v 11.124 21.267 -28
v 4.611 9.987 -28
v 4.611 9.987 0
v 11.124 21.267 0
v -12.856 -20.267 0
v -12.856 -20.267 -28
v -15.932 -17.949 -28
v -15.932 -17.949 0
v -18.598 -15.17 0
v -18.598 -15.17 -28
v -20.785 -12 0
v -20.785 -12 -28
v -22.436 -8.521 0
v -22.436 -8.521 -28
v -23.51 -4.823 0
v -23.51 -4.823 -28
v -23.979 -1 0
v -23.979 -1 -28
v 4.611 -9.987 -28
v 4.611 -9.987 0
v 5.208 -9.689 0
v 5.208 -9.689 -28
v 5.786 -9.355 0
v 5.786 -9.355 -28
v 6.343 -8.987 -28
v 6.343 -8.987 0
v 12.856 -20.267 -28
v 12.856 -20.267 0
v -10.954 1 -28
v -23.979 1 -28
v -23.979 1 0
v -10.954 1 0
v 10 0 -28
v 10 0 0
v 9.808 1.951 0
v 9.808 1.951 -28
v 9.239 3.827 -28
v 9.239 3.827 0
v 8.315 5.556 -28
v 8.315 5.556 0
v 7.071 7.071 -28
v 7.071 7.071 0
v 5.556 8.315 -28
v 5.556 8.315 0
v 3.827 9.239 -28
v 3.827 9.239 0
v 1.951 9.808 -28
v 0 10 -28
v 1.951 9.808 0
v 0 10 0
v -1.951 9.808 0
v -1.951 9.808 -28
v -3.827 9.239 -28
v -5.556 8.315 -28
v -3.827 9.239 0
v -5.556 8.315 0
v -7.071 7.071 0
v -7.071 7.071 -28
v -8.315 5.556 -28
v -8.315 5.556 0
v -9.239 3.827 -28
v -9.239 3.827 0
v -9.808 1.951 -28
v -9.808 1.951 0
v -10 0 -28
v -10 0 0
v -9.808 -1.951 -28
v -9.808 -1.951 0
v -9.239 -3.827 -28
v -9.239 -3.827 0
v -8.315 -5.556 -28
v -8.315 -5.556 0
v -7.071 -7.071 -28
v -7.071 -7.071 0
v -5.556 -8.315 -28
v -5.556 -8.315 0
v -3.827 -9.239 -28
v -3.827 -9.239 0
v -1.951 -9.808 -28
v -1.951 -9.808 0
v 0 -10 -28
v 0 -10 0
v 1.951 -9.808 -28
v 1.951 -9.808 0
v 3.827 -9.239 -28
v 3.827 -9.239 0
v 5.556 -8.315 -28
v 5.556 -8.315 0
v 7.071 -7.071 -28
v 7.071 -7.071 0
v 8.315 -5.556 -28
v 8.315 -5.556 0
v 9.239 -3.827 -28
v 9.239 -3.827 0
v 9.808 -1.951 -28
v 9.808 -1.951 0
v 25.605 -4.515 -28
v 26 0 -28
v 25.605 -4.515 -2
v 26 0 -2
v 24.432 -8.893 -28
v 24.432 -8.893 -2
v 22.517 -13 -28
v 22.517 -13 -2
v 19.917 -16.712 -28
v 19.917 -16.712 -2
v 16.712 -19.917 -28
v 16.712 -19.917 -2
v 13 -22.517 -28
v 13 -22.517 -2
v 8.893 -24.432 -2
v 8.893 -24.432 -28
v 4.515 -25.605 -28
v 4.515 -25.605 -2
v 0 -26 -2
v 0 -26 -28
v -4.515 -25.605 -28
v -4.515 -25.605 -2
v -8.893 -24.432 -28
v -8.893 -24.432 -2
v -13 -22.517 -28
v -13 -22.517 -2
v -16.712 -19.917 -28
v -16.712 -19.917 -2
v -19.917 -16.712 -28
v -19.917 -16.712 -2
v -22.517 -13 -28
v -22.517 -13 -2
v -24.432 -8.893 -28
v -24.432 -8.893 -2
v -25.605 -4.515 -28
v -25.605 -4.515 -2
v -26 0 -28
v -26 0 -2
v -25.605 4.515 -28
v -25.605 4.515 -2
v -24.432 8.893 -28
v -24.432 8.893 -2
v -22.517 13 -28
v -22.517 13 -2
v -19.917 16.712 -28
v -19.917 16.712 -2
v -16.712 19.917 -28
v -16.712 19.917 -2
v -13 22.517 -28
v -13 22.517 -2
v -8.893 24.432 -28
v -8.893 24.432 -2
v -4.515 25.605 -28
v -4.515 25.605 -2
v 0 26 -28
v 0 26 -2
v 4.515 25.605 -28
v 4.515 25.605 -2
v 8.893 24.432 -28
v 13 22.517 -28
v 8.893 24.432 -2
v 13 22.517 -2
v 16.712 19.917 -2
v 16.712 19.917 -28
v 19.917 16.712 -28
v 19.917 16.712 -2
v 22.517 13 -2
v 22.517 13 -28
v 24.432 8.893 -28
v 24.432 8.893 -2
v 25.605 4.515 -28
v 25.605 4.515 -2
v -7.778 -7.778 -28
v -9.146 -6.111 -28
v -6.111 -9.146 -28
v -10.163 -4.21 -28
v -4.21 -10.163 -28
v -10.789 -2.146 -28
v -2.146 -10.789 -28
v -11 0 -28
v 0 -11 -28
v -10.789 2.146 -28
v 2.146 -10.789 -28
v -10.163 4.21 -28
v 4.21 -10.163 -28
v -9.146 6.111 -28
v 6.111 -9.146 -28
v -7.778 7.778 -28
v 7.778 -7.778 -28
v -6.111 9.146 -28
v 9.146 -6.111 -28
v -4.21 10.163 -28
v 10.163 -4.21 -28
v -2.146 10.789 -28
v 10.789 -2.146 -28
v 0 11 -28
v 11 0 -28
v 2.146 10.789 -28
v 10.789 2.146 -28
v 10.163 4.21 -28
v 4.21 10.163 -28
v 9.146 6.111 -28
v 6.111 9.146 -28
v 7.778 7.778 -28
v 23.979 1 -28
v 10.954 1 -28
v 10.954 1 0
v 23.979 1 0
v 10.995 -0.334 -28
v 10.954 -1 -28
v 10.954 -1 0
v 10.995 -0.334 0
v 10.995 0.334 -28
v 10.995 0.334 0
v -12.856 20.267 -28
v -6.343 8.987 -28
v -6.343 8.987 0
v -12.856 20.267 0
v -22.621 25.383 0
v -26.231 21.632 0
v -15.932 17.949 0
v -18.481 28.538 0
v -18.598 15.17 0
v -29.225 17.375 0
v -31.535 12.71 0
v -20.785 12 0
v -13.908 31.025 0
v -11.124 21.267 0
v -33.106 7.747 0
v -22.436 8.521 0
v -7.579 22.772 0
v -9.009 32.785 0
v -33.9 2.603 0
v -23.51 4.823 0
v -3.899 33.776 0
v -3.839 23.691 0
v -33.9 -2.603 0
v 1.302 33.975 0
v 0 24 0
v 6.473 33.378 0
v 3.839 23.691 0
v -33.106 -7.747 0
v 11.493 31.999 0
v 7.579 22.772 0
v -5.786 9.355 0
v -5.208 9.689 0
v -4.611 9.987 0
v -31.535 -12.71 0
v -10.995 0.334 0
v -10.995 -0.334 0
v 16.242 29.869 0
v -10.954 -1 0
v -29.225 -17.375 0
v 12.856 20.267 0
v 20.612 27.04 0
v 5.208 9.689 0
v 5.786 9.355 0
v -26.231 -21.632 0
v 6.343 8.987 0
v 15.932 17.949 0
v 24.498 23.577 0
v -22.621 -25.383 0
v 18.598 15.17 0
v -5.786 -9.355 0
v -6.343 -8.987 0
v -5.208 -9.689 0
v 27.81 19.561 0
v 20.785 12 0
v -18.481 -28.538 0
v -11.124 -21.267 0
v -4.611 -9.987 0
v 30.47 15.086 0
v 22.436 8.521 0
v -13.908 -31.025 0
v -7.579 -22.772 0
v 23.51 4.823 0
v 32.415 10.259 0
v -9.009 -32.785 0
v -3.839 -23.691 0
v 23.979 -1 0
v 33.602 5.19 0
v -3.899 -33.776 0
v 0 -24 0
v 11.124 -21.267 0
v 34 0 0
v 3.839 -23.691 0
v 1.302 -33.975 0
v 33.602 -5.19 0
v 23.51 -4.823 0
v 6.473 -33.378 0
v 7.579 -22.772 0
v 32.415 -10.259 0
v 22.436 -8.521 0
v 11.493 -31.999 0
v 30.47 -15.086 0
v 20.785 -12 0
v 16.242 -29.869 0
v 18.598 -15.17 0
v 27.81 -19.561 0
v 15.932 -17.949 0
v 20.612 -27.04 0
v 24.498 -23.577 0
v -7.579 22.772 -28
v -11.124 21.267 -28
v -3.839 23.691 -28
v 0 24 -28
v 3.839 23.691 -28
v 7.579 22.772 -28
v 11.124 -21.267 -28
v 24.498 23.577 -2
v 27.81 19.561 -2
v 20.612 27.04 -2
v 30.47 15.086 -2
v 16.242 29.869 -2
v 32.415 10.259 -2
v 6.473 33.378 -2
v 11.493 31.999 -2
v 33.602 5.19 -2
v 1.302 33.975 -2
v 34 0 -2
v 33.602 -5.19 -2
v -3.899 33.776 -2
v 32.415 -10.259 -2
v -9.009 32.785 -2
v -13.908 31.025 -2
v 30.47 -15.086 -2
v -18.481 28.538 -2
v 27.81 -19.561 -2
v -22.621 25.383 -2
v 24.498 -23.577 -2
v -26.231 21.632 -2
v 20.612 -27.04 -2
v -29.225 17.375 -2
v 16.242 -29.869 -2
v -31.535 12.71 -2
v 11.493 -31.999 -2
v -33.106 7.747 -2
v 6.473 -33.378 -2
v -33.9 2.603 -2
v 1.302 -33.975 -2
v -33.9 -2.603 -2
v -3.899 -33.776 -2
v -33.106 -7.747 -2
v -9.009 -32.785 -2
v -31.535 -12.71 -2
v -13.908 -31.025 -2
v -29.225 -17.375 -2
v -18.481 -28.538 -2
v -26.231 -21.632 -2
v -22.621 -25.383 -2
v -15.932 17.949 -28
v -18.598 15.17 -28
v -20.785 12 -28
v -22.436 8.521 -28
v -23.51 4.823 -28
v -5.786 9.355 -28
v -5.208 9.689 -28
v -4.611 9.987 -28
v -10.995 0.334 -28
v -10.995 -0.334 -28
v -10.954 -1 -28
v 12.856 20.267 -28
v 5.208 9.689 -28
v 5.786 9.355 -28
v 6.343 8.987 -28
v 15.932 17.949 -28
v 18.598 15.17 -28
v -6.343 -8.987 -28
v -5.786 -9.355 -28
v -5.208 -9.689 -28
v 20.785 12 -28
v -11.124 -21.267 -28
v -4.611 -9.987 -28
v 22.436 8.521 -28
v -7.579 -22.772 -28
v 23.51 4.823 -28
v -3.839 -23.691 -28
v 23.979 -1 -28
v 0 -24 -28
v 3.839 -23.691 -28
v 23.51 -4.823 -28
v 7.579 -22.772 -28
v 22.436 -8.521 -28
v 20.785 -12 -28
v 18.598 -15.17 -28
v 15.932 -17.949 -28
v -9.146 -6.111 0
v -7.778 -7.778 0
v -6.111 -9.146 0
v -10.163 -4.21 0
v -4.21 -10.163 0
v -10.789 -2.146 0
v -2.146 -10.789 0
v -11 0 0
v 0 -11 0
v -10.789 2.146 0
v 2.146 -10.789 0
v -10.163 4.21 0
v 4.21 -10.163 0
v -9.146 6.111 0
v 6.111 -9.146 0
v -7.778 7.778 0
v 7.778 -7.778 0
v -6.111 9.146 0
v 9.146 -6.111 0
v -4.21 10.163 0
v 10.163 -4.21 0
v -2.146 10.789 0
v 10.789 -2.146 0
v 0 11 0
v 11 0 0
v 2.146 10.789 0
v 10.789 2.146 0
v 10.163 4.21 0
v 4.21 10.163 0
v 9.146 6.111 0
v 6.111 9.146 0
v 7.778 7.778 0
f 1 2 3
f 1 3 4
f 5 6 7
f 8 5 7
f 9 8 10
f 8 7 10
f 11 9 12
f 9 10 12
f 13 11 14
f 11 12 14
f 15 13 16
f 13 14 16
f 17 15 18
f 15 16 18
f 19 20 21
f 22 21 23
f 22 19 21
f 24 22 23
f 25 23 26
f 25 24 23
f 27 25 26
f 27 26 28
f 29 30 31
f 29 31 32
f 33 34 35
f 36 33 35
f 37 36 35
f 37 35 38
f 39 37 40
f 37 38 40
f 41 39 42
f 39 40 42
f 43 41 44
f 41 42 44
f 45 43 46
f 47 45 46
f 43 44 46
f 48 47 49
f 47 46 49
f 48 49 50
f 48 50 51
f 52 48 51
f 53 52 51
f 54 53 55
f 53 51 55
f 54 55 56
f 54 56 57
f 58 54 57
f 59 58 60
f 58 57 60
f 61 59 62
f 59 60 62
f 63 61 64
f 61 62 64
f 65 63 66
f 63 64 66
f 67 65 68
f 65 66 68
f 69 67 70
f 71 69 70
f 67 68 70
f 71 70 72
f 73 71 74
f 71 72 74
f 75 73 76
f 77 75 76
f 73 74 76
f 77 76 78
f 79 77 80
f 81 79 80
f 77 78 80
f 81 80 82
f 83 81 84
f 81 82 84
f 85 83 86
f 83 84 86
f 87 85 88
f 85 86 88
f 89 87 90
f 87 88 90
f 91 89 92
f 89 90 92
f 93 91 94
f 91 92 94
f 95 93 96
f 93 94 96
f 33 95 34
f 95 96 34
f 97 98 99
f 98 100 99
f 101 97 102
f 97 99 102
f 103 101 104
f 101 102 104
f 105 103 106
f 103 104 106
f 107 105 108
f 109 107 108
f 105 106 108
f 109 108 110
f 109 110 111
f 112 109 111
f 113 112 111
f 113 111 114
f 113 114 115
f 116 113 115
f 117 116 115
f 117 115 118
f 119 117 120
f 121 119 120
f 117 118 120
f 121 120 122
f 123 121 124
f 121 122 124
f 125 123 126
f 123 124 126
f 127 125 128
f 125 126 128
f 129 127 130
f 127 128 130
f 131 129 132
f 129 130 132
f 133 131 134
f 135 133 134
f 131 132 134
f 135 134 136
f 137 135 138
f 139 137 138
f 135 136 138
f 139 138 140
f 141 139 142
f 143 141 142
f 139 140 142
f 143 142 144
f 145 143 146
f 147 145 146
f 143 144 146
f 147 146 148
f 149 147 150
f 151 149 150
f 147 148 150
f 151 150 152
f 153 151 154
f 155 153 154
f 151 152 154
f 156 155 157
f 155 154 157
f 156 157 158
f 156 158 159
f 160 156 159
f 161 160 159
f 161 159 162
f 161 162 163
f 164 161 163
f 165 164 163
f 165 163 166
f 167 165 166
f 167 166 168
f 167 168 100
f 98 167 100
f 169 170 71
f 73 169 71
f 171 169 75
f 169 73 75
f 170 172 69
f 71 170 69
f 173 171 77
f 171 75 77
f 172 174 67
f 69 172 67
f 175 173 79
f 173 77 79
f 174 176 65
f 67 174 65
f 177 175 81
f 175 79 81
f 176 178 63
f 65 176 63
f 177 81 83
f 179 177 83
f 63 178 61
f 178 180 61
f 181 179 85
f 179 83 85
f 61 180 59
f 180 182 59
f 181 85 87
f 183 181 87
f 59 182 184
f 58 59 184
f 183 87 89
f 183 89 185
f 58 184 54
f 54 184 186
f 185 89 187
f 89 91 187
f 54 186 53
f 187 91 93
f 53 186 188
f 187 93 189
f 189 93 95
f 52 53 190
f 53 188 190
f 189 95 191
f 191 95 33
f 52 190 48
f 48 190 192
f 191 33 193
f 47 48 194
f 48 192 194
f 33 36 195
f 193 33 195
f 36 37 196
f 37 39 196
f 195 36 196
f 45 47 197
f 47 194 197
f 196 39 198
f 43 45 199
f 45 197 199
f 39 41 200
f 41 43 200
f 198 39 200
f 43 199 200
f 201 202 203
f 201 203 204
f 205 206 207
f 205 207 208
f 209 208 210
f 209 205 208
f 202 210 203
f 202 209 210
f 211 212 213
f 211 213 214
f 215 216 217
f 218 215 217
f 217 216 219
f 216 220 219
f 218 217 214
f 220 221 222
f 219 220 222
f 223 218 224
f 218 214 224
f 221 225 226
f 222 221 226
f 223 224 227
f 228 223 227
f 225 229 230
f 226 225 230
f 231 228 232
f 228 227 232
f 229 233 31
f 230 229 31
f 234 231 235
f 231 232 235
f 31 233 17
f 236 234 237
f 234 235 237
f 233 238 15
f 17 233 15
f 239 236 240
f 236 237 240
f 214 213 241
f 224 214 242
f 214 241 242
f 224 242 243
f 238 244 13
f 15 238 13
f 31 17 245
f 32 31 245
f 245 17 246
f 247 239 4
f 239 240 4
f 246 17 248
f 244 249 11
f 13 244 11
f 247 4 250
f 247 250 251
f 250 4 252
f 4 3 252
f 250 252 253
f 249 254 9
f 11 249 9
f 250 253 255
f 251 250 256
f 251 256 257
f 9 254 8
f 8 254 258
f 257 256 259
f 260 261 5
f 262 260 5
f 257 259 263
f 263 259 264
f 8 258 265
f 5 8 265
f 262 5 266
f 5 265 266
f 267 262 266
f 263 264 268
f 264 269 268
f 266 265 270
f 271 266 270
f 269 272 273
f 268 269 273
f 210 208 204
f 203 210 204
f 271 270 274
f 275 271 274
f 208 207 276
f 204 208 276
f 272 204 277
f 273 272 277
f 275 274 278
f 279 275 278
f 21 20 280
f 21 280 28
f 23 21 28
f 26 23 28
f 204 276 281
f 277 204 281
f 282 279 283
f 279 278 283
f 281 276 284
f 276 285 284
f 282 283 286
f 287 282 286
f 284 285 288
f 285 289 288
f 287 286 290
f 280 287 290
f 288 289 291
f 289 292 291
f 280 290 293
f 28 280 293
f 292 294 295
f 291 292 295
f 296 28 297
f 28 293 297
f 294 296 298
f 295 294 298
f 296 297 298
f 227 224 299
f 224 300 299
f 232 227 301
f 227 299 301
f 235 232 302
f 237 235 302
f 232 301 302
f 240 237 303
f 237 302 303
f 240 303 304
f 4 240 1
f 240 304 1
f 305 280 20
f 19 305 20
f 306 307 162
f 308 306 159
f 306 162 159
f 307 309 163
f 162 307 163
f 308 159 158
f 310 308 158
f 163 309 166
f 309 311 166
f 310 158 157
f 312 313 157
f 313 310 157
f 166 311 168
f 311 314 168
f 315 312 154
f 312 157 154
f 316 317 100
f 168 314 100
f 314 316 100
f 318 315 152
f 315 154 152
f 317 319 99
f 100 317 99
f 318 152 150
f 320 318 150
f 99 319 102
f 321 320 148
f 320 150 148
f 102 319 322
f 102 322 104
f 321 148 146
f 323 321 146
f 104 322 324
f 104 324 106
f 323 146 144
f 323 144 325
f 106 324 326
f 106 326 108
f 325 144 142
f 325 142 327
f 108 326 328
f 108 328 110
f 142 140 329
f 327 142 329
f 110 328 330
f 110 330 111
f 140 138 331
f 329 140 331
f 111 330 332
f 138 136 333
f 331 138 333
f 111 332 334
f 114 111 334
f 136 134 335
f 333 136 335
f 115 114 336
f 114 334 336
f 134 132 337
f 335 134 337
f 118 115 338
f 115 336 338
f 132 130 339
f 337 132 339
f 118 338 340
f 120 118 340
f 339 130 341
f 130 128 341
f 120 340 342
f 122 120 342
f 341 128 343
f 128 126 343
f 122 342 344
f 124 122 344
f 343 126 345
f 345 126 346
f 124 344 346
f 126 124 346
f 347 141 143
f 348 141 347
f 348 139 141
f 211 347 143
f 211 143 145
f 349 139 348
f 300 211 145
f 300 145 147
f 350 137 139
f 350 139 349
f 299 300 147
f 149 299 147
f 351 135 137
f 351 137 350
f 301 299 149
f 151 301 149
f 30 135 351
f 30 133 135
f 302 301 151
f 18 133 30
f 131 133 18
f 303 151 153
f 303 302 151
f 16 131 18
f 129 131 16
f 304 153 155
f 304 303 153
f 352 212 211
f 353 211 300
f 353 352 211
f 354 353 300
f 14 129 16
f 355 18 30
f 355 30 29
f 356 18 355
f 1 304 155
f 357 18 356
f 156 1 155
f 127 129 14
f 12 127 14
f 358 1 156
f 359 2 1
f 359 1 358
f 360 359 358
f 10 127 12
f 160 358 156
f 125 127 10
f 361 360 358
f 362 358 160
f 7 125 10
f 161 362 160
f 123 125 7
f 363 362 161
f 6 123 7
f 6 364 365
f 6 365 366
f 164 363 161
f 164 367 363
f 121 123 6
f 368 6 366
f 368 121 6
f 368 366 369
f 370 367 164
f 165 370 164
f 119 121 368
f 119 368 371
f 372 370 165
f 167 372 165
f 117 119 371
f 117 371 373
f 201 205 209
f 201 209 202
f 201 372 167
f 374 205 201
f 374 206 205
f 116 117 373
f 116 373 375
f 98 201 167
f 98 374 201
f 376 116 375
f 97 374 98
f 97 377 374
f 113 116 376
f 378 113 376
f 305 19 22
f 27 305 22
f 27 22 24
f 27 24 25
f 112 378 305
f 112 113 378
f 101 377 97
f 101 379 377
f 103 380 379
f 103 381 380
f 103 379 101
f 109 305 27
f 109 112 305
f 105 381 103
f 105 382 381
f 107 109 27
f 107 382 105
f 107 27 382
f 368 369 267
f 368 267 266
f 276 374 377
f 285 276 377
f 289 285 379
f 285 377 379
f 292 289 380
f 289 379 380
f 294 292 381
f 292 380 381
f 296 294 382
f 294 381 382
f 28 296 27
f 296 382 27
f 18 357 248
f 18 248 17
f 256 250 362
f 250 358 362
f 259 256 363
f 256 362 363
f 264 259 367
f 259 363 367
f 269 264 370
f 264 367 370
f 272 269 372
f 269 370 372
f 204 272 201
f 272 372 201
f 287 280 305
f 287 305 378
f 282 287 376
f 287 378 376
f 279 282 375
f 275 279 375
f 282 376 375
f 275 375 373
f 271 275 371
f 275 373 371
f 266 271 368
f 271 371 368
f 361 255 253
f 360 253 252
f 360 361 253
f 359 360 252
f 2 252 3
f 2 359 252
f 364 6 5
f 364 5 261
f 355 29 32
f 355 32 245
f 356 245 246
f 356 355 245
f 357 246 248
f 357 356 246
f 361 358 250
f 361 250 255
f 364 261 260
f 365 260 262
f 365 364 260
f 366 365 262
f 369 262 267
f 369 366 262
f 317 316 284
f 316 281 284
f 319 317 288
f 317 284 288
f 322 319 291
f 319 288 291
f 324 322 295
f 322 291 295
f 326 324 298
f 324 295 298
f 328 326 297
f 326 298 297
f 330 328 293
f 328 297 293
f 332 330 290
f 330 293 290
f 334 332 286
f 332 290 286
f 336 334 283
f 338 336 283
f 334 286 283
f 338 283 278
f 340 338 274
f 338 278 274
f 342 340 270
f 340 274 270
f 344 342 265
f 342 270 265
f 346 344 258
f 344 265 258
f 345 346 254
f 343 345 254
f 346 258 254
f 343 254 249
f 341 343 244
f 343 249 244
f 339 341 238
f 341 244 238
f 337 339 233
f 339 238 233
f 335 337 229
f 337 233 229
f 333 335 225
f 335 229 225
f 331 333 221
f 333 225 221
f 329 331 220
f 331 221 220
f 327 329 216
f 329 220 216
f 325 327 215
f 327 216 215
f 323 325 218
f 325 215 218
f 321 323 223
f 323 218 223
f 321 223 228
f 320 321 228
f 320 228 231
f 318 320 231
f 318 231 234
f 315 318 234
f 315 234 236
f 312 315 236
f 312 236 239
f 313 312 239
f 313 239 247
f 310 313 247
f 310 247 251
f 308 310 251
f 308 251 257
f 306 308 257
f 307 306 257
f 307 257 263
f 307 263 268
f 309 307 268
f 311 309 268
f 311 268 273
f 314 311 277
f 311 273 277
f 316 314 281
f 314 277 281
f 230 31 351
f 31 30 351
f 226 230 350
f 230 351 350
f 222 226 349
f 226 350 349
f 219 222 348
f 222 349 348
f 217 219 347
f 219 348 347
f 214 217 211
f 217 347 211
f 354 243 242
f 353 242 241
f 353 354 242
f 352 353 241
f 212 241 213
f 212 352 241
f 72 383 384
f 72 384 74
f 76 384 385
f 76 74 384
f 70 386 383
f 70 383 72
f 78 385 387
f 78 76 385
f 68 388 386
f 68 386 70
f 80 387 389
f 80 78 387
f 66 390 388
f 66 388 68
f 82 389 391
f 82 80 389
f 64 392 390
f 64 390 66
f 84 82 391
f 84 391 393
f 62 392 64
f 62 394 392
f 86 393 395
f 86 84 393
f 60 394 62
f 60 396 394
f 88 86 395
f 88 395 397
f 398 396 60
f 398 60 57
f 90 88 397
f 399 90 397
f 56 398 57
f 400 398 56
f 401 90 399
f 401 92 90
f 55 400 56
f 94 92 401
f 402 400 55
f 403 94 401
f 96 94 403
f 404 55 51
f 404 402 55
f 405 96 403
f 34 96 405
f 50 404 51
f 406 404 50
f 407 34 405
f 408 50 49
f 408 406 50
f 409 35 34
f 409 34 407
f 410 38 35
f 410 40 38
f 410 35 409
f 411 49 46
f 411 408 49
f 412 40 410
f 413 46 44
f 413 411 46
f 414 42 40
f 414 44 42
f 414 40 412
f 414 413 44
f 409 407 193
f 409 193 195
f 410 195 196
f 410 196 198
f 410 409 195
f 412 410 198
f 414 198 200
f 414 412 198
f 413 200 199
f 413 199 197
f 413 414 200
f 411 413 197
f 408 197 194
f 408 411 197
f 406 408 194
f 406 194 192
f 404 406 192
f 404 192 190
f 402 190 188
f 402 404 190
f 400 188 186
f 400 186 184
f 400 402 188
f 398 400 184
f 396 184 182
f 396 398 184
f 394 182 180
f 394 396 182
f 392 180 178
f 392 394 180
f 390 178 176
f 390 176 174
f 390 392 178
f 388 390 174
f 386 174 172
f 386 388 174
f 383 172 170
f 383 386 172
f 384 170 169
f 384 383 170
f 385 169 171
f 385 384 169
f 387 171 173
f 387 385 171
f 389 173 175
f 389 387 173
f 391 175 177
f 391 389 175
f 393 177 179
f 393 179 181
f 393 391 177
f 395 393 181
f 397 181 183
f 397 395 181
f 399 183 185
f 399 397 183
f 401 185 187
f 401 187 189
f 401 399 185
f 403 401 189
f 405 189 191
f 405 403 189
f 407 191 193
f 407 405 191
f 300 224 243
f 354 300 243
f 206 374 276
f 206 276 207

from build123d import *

# Parameters (mm, degrees)
F2_R     = 11
F2_R_2   = 10
F3_DEPTH = 28
F5_DEPTH = 28


with BuildPart() as f1:
    # F0 (on Front) → F1 (revolve)
    with BuildSketch(Plane.XZ):
        Polygon((34, 0), (24, 0), (24, -28), (26, -28), (26, -2), (34, -2), align=None)
    revolve(axis=Axis((0, 0, -3.8373200223), (0, 0, -1)))

    # F4 (on face) → F5 (join, through all)
    with BuildSketch(Plane(origin=(0, 0, -28), x_dir=(1, 0, 0), z_dir=(0, 0, -1))):
        with BuildLine():
            Line((-10.9544511501, 1), (-23.9791576166, 1))
            ThreePointArc((-23.9791576166, 1), (-24, 0), (-23.9791576166, -1))
            Line((-23.9791576166, -1), (-10.9544511501, -1))
            ThreePointArc((-10.9544511501, -1), (-11, 0), (-10.9544511501, 1))
        make_face()
        with BuildLine():
            Line((-6.3432509788, -8.9868329805), (-12.8556042121, -20.2665596573))
            ThreePointArc((-12.8556042121, -20.2665596573), (-12, -20.7846096908), (-11.1235534045, -21.2665596573))
            Line((-11.1235534045, -21.2665596573), (-4.6112001713, -9.9868329805))
            ThreePointArc((-4.6112001713, -9.9868329805), (-5.5, -9.5262794416), (-6.3432509788, -8.9868329805))
        make_face()
        with BuildLine():
            Line((4.6112001713, -9.9868329805), (11.1235534045, -21.2665596573))
            ThreePointArc((11.1235534045, -21.2665596573), (12, -20.7846096908), (12.8556042121, -20.2665596573))
            Line((12.8556042121, -20.2665596573), (6.3432509788, -8.9868329805))
            ThreePointArc((6.3432509788, -8.9868329805), (5.5, -9.5262794416), (4.6112001713, -9.9868329805))
        make_face()
        with BuildLine():
            Line((10.9544511501, -1), (23.9791576166, -1))
            ThreePointArc((23.9791576166, -1), (24, 0), (23.9791576166, 1))
            Line((23.9791576166, 1), (10.9544511501, 1))
            ThreePointArc((10.9544511501, 1), (11, 0), (10.9544511501, -1))
        make_face()
        with BuildLine():
            Line((6.3432509788, 8.9868329805), (12.8556042121, 20.2665596573))
            ThreePointArc((12.8556042121, 20.2665596573), (12, 20.7846096908), (11.1235534045, 21.2665596573))
            Line((11.1235534045, 21.2665596573), (4.6112001713, 9.9868329805))
            ThreePointArc((4.6112001713, 9.9868329805), (5.5, 9.5262794416), (6.3432509788, 8.9868329805))
        make_face()
        with BuildLine():
            Line((-4.6112001713, 9.9868329805), (-11.1235534045, 21.2665596573))
            ThreePointArc((-11.1235534045, 21.2665596573), (-12, 20.7846096908), (-12.8556042121, 20.2665596573))
            Line((-12.8556042121, 20.2665596573), (-6.3432509788, 8.9868329805))
            ThreePointArc((-6.3432509788, 8.9868329805), (-5.5, 9.5262794416), (-4.6112001713, 9.9868329805))
        make_face()
    extrude(amount=-F5_DEPTH)


with BuildPart() as f3:
    # F2 (on Top) → F3 (new body, through all)
    with BuildSketch(Plane.XY):
        Circle(F2_R)
        Circle(F2_R_2, mode=Mode.SUBTRACT)
    extrude(amount=-F3_DEPTH)


solid = Compound([f1.part, f3.part])
